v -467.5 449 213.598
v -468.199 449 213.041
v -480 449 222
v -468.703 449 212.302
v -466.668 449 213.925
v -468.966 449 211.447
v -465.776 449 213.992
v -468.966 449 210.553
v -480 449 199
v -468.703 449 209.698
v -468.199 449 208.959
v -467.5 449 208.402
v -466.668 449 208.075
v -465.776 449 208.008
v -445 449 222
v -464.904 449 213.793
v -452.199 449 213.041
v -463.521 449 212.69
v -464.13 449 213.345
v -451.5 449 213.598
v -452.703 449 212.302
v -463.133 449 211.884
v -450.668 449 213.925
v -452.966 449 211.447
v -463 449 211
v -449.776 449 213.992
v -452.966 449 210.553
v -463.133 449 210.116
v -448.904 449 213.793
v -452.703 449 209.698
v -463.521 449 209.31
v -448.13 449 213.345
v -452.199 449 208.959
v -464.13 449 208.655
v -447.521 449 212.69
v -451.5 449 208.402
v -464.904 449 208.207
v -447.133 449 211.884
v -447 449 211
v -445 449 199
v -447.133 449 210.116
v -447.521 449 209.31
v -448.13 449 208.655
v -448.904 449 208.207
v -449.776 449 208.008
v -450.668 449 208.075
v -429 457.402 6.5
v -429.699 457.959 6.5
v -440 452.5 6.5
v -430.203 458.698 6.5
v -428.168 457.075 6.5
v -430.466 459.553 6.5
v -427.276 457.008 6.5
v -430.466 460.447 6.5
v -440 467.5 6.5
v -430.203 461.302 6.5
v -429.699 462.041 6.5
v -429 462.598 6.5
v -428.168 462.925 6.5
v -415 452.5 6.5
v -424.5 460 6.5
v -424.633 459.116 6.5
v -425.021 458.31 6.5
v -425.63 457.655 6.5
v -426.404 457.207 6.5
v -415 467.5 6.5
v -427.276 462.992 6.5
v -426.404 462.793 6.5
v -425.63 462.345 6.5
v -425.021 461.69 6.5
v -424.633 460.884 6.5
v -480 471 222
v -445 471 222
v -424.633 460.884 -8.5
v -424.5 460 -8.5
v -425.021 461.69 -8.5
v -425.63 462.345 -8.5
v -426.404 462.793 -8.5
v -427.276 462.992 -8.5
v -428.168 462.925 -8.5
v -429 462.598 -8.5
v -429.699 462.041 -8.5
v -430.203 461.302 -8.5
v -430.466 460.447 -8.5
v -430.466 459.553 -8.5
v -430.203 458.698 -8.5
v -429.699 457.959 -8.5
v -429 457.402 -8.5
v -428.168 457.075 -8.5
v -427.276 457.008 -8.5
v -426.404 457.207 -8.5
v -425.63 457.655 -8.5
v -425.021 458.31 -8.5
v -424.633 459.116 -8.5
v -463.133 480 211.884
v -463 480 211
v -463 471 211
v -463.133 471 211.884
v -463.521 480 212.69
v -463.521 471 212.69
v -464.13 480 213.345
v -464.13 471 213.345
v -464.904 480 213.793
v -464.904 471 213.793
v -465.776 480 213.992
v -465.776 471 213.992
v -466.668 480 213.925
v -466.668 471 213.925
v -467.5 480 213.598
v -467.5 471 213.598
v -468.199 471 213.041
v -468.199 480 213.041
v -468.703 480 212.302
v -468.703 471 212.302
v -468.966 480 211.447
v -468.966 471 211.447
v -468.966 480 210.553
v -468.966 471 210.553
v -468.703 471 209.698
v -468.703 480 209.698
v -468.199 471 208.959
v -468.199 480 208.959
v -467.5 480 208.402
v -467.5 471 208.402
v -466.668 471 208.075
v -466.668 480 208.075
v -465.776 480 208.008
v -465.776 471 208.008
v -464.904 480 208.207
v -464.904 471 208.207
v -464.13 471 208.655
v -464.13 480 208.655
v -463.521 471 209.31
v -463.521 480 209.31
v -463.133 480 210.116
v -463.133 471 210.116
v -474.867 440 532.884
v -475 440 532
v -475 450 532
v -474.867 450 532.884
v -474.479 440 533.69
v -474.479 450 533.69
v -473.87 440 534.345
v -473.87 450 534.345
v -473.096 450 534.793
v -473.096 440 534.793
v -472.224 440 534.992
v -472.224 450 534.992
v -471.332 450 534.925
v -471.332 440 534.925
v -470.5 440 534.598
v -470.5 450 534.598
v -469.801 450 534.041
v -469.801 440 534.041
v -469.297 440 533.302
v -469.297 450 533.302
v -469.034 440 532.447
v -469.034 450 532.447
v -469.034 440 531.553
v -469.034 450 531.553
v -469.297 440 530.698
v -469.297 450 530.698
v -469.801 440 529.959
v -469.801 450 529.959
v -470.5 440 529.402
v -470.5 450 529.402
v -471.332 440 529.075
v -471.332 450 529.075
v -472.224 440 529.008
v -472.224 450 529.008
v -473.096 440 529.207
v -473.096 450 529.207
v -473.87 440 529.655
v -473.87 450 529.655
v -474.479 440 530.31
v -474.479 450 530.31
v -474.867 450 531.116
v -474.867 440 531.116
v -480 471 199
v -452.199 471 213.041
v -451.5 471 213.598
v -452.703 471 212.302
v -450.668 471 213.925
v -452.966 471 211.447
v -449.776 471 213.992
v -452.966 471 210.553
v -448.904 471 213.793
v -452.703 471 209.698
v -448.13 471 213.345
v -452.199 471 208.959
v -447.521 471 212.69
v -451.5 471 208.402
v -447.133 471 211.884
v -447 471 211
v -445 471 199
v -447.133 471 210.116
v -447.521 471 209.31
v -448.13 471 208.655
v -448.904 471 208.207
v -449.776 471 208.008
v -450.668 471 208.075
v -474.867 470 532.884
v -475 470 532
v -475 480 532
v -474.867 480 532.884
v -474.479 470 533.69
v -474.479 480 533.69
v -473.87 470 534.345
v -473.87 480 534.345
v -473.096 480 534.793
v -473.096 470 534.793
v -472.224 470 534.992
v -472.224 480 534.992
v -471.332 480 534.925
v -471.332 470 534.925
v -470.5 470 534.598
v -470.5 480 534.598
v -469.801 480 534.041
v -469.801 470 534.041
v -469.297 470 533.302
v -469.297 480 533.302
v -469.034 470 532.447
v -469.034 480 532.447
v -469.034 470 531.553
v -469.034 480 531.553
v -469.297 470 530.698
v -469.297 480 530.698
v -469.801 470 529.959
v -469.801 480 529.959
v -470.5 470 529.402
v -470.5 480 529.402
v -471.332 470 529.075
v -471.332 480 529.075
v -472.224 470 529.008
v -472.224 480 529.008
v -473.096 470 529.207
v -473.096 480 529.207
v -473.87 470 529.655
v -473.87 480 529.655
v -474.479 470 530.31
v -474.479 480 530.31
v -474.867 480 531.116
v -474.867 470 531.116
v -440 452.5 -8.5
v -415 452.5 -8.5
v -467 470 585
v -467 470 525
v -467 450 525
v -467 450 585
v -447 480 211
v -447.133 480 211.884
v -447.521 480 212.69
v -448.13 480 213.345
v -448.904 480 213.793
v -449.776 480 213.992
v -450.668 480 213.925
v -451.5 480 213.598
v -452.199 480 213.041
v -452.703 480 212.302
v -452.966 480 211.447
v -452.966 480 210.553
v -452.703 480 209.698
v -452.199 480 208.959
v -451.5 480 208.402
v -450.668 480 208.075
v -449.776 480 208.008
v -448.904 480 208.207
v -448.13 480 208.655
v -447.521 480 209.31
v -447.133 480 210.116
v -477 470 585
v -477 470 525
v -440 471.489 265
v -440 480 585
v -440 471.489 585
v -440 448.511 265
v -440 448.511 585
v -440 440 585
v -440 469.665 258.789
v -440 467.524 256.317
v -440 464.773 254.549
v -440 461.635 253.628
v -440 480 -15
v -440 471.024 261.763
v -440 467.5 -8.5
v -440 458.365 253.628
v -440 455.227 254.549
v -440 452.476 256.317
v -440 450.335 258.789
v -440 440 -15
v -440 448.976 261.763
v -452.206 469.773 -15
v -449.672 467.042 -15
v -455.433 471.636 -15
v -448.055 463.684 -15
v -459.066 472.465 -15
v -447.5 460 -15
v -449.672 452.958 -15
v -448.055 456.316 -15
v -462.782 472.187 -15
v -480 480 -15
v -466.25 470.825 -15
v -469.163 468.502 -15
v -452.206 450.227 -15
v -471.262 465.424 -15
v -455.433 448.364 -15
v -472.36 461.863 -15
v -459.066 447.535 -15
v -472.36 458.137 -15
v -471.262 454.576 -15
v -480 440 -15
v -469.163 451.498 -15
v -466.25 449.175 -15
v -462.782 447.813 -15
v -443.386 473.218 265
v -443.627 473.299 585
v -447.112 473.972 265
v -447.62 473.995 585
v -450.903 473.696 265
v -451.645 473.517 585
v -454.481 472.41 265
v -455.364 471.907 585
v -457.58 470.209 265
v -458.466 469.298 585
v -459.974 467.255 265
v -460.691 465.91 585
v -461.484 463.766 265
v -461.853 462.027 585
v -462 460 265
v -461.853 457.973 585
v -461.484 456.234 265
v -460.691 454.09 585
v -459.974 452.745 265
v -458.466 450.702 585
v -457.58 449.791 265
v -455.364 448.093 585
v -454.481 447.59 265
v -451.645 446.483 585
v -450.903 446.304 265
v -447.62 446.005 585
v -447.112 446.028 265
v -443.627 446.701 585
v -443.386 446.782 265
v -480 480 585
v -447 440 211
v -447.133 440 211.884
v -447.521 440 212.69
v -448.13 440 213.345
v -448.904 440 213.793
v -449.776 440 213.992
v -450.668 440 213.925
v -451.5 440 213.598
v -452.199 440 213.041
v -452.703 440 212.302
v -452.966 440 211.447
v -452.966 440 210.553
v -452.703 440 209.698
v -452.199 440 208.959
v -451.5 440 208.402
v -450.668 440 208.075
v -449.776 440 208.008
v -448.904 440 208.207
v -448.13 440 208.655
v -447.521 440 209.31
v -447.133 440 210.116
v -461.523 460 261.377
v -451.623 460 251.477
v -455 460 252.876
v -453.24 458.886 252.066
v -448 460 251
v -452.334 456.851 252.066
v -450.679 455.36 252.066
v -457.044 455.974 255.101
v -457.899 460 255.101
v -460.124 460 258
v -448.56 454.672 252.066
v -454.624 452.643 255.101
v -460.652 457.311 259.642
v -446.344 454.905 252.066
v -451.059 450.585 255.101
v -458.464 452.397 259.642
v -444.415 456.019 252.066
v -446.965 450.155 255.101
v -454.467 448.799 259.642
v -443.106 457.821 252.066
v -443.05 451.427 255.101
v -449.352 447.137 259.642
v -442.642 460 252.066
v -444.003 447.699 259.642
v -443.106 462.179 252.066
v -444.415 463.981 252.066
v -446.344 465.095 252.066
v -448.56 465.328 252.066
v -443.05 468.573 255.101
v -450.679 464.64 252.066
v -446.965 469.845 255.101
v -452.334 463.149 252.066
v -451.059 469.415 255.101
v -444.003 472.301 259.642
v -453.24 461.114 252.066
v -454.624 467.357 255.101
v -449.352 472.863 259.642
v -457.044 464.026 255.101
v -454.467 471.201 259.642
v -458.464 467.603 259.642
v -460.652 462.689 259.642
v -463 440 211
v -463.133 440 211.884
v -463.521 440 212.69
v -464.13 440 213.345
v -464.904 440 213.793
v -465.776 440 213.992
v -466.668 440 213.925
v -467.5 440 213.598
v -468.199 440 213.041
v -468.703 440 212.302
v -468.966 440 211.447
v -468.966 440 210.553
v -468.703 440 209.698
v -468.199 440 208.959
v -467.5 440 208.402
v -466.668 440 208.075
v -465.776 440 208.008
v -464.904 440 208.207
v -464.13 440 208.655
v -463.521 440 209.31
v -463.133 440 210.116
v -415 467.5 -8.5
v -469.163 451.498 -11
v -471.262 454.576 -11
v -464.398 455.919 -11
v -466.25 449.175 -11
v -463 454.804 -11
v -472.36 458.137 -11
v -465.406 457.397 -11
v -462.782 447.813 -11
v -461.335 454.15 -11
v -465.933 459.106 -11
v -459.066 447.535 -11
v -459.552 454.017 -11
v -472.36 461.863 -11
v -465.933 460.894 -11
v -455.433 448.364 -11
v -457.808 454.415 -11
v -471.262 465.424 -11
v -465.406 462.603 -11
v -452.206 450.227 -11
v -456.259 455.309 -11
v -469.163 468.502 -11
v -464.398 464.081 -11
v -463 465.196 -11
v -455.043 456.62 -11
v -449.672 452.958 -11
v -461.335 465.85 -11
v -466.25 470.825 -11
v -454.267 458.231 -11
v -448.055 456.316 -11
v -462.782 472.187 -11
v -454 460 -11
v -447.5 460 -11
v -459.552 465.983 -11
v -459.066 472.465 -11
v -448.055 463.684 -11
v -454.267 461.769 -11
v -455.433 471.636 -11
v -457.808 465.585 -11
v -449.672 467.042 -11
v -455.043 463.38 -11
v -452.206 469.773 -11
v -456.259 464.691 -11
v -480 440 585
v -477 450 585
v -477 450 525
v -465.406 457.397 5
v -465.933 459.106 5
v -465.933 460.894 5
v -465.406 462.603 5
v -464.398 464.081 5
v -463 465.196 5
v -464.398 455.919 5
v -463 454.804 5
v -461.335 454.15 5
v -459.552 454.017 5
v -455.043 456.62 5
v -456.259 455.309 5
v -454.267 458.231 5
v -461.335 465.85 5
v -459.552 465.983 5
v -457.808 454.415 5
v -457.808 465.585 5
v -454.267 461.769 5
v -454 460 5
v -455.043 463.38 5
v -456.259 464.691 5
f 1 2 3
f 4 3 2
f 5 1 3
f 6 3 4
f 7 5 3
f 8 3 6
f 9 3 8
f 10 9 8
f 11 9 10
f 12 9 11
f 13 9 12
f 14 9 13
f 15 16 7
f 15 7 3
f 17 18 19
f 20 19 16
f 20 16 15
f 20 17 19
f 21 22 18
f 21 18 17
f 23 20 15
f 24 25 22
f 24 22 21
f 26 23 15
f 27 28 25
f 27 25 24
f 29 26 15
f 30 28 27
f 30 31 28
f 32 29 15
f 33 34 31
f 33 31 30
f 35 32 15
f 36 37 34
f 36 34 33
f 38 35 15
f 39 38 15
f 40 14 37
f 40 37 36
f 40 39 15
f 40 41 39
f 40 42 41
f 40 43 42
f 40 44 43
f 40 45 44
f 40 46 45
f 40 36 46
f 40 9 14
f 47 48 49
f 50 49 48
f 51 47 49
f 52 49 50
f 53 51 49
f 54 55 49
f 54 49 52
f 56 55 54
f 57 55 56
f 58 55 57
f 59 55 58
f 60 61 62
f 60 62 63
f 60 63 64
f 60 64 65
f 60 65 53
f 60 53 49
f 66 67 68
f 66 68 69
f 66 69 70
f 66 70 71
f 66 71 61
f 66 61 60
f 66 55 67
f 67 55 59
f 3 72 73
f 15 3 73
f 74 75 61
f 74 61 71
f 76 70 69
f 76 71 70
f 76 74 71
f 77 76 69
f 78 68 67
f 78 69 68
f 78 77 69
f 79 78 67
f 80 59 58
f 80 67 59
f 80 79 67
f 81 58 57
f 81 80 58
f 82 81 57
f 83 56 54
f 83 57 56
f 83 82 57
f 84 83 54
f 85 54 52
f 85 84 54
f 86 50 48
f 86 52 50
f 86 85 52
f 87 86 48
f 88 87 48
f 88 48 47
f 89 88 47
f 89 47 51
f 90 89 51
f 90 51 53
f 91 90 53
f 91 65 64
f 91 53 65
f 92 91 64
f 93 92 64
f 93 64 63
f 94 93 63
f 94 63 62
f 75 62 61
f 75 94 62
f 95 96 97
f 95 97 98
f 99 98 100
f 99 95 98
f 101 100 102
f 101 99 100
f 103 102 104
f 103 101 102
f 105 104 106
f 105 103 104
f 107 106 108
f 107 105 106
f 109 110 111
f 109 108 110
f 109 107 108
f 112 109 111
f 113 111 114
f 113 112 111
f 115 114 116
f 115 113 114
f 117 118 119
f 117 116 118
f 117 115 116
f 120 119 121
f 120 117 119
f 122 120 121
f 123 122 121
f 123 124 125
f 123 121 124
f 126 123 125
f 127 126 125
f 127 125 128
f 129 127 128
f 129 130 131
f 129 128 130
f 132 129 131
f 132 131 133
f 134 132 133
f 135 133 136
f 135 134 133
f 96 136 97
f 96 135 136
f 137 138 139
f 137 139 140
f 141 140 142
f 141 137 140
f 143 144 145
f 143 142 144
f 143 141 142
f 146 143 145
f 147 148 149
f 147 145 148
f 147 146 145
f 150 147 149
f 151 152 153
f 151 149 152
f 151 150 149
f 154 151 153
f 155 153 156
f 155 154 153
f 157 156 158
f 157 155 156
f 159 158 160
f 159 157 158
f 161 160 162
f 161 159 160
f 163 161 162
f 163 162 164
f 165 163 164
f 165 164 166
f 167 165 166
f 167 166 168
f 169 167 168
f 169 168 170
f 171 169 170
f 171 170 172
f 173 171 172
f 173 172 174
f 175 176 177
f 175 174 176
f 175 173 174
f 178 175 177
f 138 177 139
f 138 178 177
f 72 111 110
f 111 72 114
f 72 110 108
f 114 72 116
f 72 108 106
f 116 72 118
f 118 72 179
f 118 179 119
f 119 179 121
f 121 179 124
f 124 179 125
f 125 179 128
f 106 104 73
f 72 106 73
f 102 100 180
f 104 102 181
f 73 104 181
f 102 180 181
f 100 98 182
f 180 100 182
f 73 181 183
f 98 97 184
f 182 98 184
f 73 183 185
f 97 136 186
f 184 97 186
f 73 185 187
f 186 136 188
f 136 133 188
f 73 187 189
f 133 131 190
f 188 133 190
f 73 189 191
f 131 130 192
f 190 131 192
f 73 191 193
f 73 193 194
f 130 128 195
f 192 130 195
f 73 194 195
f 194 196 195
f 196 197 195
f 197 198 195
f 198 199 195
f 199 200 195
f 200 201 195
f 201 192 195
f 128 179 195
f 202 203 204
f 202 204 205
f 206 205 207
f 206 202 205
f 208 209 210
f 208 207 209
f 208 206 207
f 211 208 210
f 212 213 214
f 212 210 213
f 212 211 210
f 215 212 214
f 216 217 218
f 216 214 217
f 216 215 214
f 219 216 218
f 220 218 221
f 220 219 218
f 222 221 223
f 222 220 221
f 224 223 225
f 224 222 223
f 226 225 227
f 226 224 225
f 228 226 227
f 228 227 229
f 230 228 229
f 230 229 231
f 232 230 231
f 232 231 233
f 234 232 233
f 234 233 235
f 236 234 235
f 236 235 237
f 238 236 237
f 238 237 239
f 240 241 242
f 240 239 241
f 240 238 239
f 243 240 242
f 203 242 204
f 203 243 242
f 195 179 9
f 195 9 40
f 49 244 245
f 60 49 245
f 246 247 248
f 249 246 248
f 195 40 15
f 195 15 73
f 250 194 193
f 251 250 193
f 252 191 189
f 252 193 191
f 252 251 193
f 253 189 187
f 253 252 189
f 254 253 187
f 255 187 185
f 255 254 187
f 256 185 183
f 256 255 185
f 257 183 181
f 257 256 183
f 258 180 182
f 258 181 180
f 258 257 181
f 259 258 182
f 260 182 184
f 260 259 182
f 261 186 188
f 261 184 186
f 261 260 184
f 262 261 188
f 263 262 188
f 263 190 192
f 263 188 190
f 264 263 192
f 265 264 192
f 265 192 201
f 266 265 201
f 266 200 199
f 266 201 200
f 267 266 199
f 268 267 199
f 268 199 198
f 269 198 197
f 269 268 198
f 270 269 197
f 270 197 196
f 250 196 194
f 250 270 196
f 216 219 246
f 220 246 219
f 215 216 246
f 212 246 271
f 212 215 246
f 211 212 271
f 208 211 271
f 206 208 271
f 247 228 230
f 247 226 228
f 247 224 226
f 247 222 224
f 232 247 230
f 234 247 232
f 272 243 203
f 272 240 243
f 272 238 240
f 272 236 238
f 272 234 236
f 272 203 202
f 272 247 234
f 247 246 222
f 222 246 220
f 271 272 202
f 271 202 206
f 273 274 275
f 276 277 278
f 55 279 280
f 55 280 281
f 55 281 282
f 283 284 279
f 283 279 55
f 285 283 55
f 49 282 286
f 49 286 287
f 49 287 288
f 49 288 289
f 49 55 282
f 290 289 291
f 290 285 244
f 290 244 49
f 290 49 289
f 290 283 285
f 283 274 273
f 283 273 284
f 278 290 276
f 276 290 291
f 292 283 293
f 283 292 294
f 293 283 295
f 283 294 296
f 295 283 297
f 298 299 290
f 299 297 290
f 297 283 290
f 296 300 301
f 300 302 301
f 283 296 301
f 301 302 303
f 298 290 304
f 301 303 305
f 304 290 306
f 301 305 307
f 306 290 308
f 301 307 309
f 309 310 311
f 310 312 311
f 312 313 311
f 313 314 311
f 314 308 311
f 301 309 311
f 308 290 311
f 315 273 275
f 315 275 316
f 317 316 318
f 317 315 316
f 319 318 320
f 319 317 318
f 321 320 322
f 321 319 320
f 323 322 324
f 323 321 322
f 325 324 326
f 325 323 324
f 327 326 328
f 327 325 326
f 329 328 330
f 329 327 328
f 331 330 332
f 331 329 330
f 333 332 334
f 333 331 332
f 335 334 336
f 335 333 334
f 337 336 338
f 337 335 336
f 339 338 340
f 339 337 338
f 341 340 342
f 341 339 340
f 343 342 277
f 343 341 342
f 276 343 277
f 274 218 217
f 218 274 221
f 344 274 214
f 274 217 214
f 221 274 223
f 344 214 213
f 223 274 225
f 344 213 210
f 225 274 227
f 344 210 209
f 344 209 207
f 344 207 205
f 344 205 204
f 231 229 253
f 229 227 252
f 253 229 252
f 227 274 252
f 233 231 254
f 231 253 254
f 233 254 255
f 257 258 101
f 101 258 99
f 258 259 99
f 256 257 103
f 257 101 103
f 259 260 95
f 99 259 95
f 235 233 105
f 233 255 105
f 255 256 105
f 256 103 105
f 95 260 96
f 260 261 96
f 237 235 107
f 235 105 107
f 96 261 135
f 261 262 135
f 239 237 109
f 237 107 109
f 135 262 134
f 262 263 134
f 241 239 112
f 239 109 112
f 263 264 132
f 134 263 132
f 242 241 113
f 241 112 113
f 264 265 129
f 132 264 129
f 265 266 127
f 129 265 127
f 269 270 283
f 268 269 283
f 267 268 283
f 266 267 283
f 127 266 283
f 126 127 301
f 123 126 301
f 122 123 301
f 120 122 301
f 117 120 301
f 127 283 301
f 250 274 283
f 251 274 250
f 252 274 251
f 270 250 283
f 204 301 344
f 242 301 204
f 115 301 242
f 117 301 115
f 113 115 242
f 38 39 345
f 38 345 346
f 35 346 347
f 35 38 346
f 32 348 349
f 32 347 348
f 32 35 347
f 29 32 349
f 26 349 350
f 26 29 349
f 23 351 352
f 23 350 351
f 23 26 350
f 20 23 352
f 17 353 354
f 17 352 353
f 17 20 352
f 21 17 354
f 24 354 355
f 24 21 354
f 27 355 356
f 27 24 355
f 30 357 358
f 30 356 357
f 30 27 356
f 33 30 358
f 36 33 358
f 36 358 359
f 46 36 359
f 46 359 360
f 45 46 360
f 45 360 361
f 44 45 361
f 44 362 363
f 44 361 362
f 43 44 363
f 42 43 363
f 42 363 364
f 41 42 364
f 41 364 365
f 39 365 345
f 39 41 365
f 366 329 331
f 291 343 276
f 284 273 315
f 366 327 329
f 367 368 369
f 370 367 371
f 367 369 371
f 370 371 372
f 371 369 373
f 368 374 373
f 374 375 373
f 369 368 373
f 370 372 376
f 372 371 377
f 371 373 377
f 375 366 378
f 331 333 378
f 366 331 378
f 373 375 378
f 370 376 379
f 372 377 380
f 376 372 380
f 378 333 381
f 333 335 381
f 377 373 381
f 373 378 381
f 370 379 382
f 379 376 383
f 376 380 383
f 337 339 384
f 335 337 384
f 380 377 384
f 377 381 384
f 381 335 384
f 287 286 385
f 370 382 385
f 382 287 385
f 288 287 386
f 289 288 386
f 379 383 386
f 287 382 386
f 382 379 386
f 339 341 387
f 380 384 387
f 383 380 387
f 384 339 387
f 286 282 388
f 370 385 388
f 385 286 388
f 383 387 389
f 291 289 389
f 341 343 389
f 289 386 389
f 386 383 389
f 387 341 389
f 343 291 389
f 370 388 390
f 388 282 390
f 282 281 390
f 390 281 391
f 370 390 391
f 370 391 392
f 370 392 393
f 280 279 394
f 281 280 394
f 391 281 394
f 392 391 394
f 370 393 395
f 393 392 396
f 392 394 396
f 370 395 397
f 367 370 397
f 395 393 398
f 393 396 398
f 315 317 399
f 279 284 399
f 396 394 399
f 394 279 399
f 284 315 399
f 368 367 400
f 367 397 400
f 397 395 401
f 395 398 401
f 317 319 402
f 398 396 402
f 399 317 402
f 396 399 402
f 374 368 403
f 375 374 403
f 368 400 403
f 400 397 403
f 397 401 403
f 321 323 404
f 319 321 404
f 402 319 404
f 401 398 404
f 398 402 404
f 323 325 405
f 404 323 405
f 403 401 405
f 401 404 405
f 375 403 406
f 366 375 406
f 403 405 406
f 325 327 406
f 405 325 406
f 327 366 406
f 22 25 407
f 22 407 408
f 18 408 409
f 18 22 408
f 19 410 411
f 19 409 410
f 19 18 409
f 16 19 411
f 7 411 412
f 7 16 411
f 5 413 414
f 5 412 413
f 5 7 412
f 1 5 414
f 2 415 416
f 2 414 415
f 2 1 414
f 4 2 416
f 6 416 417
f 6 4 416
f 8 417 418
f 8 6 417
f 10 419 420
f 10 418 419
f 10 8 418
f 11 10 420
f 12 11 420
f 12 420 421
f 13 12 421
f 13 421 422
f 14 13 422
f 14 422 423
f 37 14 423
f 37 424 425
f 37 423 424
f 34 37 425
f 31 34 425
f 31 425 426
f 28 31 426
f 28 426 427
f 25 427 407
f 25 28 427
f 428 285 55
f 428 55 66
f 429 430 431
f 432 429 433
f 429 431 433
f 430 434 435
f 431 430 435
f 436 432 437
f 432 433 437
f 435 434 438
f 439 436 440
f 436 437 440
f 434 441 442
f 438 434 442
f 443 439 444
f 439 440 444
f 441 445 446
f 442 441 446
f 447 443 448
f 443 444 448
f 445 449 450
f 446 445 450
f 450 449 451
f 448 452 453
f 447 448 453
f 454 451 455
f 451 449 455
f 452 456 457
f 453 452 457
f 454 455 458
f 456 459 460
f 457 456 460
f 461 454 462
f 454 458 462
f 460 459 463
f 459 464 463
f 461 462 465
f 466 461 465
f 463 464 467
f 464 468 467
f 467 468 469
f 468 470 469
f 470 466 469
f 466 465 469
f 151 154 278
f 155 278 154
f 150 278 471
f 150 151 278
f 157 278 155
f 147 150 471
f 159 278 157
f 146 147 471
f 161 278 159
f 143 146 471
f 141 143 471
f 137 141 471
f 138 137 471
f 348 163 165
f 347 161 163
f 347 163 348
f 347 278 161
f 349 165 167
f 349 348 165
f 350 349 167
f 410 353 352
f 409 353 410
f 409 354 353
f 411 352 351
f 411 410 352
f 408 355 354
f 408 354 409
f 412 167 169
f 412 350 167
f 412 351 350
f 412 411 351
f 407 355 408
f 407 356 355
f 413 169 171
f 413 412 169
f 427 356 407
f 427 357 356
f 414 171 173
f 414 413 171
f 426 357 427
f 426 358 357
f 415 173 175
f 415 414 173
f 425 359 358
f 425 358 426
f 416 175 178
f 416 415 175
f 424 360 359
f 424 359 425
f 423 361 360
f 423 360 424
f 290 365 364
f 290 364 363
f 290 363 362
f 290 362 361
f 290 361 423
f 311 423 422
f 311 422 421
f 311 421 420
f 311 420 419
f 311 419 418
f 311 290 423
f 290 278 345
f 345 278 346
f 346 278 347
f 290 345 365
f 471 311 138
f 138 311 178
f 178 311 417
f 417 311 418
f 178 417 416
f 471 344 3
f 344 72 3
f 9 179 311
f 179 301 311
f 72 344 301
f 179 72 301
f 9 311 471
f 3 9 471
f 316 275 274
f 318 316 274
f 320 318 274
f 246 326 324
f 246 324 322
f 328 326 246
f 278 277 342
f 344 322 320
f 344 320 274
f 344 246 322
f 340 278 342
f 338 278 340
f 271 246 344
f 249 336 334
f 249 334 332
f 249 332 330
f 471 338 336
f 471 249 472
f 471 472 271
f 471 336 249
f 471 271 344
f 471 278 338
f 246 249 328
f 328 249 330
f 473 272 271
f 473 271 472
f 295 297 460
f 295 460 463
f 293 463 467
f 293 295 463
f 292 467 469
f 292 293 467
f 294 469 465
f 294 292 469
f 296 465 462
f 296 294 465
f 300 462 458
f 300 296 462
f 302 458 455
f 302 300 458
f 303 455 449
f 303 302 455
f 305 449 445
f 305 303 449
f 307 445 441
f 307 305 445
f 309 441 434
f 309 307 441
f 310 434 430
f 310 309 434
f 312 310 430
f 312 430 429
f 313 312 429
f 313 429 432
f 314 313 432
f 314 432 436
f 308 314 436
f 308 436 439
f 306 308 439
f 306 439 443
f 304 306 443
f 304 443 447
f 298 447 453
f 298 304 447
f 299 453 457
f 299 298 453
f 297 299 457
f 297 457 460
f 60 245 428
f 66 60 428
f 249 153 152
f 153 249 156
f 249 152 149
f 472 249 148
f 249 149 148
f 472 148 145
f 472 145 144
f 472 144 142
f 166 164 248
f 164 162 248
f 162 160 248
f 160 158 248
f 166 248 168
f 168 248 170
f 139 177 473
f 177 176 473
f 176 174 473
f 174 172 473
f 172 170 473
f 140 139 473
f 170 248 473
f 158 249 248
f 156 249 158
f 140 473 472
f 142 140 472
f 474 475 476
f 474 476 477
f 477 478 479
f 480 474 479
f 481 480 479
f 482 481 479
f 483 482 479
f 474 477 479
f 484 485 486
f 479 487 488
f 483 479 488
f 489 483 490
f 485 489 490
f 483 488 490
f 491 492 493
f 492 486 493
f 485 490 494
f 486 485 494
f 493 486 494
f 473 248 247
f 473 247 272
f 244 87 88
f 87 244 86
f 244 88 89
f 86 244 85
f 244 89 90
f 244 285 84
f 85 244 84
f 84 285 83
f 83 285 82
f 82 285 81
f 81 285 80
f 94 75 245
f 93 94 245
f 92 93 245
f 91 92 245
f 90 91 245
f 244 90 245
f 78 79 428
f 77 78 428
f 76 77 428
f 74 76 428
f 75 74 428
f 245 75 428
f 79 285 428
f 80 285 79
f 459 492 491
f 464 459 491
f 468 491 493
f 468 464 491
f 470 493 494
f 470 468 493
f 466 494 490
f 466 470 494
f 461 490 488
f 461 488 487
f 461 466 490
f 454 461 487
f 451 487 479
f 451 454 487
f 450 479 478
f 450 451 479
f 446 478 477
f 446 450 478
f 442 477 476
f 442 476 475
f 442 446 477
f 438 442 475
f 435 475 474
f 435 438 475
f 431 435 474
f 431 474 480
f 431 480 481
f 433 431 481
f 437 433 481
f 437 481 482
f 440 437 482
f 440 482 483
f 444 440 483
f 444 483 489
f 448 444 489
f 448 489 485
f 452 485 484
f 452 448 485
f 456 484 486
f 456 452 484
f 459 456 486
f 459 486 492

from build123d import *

# Parameters (mm, degrees)
CYLINDER265_R          = 3
CYLINDER265_DEPTH      = 50
CYLINDER265_ROLL_ANGLE = 90
BOX129_W               = 60
BOX129_H               = 22
BOX129_DEPTH           = 23
CYLINDER193_R          = 3
CYLINDER193_DEPTH      = 100
CYLINDER193_ROLL_ANGLE = 90
CYLINDER188_R          = 3
CYLINDER188_DEPTH      = 65
BOX117_W               = 25
BOX117_H               = 15
BOX117_DEPTH           = 15
CYLINDER186_R          = 6
CYLINDER186_DEPTH      = 16
CYLINDER187_R          = 12.5
CYLINDER187_DEPTH      = 4
CYLINDER185_R          = 3
CYLINDER185_DEPTH      = 60
CYLINDER185_ROLL_ANGLE = 90
BOX116_W               = 10
BOX116_H               = 20
BOX116_DEPTH           = 60
CYLINDER184_R          = 14
CYLINDER184_DEPTH      = 320
BOX115_W               = 40
BOX115_H               = 40
BOX115_DEPTH           = 600
CUT233_PLACEMENT_ANGLE = 180


with BuildPart() as agujero_reposapies004:
    # Cylinder265 → Cylinder265 (new body)
    with BuildSketch(Plane.XY):
        Circle(CYLINDER265_R)
    extrude(amount=CYLINDER265_DEPTH)


with BuildPart() as agujero_reposapies004_1:
    # Cylinder265 roll: moved
    add(agujero_reposapies004.part.rotate(Axis((0, 0, 0), (1, 0, 0)), CYLINDER265_ROLL_ANGLE))


with BuildPart() as agujero_reposapies004_2:
    # Cylinder265 placement: moved
    add(agujero_reposapies004_1.part.moved(Location((-466, 485, 211))))


with BuildPart() as cubo092:
    # Box129 → Box129 (new body)
    with BuildSketch(Plane(origin=(-505, 449, 199), x_dir=(1, 0, 0), z_dir=(0, 0, 1))):
        with Locations((30, 11)):
            Rectangle(BOX129_W, BOX129_H)
    extrude(amount=BOX129_DEPTH)


with BuildPart() as agujero_reposapies002:
    # Cylinder193 → Cylinder193 (new body)
    with BuildSketch(Plane.XY):
        Circle(CYLINDER193_R)
    extrude(amount=CYLINDER193_DEPTH)


with BuildPart() as agujero_reposapies002_1:
    # Cylinder193 roll: moved
    add(agujero_reposapies002.part.rotate(Axis((0, 0, 0), (1, 0, 0)), CYLINDER193_ROLL_ANGLE))


with BuildPart() as agujero_reposapies002_2:
    # Cylinder193 placement: moved
    add(agujero_reposapies002_1.part.moved(Location((-450, 50, 211))))


with BuildPart() as cilindro105:
    # Cylinder188 → Cylinder188 (new body)
    with BuildSketch(Plane(origin=(-427.5, 0, -24.5), x_dir=(1, 0, 0), z_dir=(0, 0, 1))):
        Circle(CYLINDER188_R)
    extrude(amount=CYLINDER188_DEPTH)


with BuildPart() as cut236:
    # Box117 → Box117 (new body)
    with BuildSketch(Plane(origin=(-440, -7.5, -8.5), x_dir=(1, 0, 0), z_dir=(0, 0, 1))):
        with Locations((12.5, 7.5)):
            Rectangle(BOX117_W, BOX117_H)
    extrude(amount=BOX117_DEPTH)

    # Cut236: cut Cilindro105
    add(cilindro105.part, mode=Mode.SUBTRACT)


with BuildPart() as pasador007:
    # Cylinder186 → Cylinder186 (new body)
    with BuildSketch(Plane(origin=(-460, 0, -11), x_dir=(1, 0, 0), z_dir=(0, 0, 1))):
        Circle(CYLINDER186_R)
    extrude(amount=CYLINDER186_DEPTH)


with BuildPart() as rodamiento006:
    # Cylinder187 → Cylinder187 (new body)
    with BuildSketch(Plane(origin=(-460, 0, -15), x_dir=(1, 0, 0), z_dir=(0, 0, 1))):
        Circle(CYLINDER187_R)
    extrude(amount=CYLINDER187_DEPTH)


with BuildPart() as esfera_de_seguridad014:
    # Sphere017 → Sphere017 (revolve)
    with BuildSketch(Plane(origin=(8, 0, 265), x_dir=(1, 0, 0), z_dir=(0, -1, 0))):
        with BuildLine():
            ThreePointArc((0, -14), (14, 0), (0, 14))
            Line((0, 14), (0, -14))
        make_face()
    revolve(axis=Axis((8, 0, 265), (0, 0, 1)))


with BuildPart() as pasador003:
    # Cylinder185 → Cylinder185 (new body)
    with BuildSketch(Plane.XY):
        Circle(CYLINDER185_R)
    extrude(amount=CYLINDER185_DEPTH)


with BuildPart() as pasador003_1:
    # Cylinder185 roll: moved
    add(pasador003.part.rotate(Axis((0, 0, 0), (1, 0, 0)), CYLINDER185_ROLL_ANGLE))


with BuildPart() as pasador003_2:
    # Cylinder185 placement: moved
    add(pasador003_1.part.moved(Location((32, 30, 532))))


with BuildPart() as agujero_del_saliente003:
    # Box116 → Box116 (new body)
    with BuildSketch(Plane(origin=(27, -10, 525), x_dir=(1, 0, 0), z_dir=(0, 0, 1))):
        with Locations((5, 10)):
            Rectangle(BOX116_W, BOX116_H)
    extrude(amount=BOX116_DEPTH)


with BuildPart() as cilindro_de_seguridad003:
    # Cylinder184 → Cylinder184 (new body)
    with BuildSketch(Plane(origin=(8, 0, 265), x_dir=(1, 0, 0), z_dir=(0, 0, 1))):
        Circle(CYLINDER184_R)
    extrude(amount=CYLINDER184_DEPTH)


with BuildPart() as cut285:
    # Box115 → Box115 (new body)
    with BuildSketch(Plane(origin=(0, -20, -15), x_dir=(1, 0, 0), z_dir=(0, 0, 1))):
        with Locations((20, 20)):
            Rectangle(BOX115_W, BOX115_H)
    extrude(amount=BOX115_DEPTH)

    # Cut230: cut cilindro de seguridad003
    add(cilindro_de_seguridad003.part, mode=Mode.SUBTRACT)

    # Cut231: cut Agujero del saliente003
    add(agujero_del_saliente003.part, mode=Mode.SUBTRACT)

    # Cut232: cut Pasador003
    add(pasador003_2.part, mode=Mode.SUBTRACT)

    # Cut233: cut esfera de seguridad014
    add(esfera_de_seguridad014.part, mode=Mode.SUBTRACT)


with BuildPart() as cut285_1:
    # Cut233 placement: moved
    add(cut285.part.moved(Location((-440, 0, 0))).rotate(Axis((-440, 0, 0), (0, 0, 1)), CUT233_PLACEMENT_ANGLE))

    # Cut234: cut rodamiento006
    add(rodamiento006.part, mode=Mode.SUBTRACT)

    # Cut235: cut PASADOR007
    add(pasador007.part, mode=Mode.SUBTRACT)

    # Fusion057: union Cut236
    add(cut236.part)

    # Cut244: cut Agujero reposapies002
    add(agujero_reposapies002_2.part, mode=Mode.SUBTRACT)


with BuildPart() as cut285_2:
    # Cut244 placement: moved
    add(cut285_1.part.moved(Location((0, 460, 0))))

    # Cut284: cut Cubo092
    add(cubo092.part, mode=Mode.SUBTRACT)

    # Cut285: cut Agujero reposapies004
    add(agujero_reposapies004_2.part, mode=Mode.SUBTRACT)


solid = cut285_2.part
